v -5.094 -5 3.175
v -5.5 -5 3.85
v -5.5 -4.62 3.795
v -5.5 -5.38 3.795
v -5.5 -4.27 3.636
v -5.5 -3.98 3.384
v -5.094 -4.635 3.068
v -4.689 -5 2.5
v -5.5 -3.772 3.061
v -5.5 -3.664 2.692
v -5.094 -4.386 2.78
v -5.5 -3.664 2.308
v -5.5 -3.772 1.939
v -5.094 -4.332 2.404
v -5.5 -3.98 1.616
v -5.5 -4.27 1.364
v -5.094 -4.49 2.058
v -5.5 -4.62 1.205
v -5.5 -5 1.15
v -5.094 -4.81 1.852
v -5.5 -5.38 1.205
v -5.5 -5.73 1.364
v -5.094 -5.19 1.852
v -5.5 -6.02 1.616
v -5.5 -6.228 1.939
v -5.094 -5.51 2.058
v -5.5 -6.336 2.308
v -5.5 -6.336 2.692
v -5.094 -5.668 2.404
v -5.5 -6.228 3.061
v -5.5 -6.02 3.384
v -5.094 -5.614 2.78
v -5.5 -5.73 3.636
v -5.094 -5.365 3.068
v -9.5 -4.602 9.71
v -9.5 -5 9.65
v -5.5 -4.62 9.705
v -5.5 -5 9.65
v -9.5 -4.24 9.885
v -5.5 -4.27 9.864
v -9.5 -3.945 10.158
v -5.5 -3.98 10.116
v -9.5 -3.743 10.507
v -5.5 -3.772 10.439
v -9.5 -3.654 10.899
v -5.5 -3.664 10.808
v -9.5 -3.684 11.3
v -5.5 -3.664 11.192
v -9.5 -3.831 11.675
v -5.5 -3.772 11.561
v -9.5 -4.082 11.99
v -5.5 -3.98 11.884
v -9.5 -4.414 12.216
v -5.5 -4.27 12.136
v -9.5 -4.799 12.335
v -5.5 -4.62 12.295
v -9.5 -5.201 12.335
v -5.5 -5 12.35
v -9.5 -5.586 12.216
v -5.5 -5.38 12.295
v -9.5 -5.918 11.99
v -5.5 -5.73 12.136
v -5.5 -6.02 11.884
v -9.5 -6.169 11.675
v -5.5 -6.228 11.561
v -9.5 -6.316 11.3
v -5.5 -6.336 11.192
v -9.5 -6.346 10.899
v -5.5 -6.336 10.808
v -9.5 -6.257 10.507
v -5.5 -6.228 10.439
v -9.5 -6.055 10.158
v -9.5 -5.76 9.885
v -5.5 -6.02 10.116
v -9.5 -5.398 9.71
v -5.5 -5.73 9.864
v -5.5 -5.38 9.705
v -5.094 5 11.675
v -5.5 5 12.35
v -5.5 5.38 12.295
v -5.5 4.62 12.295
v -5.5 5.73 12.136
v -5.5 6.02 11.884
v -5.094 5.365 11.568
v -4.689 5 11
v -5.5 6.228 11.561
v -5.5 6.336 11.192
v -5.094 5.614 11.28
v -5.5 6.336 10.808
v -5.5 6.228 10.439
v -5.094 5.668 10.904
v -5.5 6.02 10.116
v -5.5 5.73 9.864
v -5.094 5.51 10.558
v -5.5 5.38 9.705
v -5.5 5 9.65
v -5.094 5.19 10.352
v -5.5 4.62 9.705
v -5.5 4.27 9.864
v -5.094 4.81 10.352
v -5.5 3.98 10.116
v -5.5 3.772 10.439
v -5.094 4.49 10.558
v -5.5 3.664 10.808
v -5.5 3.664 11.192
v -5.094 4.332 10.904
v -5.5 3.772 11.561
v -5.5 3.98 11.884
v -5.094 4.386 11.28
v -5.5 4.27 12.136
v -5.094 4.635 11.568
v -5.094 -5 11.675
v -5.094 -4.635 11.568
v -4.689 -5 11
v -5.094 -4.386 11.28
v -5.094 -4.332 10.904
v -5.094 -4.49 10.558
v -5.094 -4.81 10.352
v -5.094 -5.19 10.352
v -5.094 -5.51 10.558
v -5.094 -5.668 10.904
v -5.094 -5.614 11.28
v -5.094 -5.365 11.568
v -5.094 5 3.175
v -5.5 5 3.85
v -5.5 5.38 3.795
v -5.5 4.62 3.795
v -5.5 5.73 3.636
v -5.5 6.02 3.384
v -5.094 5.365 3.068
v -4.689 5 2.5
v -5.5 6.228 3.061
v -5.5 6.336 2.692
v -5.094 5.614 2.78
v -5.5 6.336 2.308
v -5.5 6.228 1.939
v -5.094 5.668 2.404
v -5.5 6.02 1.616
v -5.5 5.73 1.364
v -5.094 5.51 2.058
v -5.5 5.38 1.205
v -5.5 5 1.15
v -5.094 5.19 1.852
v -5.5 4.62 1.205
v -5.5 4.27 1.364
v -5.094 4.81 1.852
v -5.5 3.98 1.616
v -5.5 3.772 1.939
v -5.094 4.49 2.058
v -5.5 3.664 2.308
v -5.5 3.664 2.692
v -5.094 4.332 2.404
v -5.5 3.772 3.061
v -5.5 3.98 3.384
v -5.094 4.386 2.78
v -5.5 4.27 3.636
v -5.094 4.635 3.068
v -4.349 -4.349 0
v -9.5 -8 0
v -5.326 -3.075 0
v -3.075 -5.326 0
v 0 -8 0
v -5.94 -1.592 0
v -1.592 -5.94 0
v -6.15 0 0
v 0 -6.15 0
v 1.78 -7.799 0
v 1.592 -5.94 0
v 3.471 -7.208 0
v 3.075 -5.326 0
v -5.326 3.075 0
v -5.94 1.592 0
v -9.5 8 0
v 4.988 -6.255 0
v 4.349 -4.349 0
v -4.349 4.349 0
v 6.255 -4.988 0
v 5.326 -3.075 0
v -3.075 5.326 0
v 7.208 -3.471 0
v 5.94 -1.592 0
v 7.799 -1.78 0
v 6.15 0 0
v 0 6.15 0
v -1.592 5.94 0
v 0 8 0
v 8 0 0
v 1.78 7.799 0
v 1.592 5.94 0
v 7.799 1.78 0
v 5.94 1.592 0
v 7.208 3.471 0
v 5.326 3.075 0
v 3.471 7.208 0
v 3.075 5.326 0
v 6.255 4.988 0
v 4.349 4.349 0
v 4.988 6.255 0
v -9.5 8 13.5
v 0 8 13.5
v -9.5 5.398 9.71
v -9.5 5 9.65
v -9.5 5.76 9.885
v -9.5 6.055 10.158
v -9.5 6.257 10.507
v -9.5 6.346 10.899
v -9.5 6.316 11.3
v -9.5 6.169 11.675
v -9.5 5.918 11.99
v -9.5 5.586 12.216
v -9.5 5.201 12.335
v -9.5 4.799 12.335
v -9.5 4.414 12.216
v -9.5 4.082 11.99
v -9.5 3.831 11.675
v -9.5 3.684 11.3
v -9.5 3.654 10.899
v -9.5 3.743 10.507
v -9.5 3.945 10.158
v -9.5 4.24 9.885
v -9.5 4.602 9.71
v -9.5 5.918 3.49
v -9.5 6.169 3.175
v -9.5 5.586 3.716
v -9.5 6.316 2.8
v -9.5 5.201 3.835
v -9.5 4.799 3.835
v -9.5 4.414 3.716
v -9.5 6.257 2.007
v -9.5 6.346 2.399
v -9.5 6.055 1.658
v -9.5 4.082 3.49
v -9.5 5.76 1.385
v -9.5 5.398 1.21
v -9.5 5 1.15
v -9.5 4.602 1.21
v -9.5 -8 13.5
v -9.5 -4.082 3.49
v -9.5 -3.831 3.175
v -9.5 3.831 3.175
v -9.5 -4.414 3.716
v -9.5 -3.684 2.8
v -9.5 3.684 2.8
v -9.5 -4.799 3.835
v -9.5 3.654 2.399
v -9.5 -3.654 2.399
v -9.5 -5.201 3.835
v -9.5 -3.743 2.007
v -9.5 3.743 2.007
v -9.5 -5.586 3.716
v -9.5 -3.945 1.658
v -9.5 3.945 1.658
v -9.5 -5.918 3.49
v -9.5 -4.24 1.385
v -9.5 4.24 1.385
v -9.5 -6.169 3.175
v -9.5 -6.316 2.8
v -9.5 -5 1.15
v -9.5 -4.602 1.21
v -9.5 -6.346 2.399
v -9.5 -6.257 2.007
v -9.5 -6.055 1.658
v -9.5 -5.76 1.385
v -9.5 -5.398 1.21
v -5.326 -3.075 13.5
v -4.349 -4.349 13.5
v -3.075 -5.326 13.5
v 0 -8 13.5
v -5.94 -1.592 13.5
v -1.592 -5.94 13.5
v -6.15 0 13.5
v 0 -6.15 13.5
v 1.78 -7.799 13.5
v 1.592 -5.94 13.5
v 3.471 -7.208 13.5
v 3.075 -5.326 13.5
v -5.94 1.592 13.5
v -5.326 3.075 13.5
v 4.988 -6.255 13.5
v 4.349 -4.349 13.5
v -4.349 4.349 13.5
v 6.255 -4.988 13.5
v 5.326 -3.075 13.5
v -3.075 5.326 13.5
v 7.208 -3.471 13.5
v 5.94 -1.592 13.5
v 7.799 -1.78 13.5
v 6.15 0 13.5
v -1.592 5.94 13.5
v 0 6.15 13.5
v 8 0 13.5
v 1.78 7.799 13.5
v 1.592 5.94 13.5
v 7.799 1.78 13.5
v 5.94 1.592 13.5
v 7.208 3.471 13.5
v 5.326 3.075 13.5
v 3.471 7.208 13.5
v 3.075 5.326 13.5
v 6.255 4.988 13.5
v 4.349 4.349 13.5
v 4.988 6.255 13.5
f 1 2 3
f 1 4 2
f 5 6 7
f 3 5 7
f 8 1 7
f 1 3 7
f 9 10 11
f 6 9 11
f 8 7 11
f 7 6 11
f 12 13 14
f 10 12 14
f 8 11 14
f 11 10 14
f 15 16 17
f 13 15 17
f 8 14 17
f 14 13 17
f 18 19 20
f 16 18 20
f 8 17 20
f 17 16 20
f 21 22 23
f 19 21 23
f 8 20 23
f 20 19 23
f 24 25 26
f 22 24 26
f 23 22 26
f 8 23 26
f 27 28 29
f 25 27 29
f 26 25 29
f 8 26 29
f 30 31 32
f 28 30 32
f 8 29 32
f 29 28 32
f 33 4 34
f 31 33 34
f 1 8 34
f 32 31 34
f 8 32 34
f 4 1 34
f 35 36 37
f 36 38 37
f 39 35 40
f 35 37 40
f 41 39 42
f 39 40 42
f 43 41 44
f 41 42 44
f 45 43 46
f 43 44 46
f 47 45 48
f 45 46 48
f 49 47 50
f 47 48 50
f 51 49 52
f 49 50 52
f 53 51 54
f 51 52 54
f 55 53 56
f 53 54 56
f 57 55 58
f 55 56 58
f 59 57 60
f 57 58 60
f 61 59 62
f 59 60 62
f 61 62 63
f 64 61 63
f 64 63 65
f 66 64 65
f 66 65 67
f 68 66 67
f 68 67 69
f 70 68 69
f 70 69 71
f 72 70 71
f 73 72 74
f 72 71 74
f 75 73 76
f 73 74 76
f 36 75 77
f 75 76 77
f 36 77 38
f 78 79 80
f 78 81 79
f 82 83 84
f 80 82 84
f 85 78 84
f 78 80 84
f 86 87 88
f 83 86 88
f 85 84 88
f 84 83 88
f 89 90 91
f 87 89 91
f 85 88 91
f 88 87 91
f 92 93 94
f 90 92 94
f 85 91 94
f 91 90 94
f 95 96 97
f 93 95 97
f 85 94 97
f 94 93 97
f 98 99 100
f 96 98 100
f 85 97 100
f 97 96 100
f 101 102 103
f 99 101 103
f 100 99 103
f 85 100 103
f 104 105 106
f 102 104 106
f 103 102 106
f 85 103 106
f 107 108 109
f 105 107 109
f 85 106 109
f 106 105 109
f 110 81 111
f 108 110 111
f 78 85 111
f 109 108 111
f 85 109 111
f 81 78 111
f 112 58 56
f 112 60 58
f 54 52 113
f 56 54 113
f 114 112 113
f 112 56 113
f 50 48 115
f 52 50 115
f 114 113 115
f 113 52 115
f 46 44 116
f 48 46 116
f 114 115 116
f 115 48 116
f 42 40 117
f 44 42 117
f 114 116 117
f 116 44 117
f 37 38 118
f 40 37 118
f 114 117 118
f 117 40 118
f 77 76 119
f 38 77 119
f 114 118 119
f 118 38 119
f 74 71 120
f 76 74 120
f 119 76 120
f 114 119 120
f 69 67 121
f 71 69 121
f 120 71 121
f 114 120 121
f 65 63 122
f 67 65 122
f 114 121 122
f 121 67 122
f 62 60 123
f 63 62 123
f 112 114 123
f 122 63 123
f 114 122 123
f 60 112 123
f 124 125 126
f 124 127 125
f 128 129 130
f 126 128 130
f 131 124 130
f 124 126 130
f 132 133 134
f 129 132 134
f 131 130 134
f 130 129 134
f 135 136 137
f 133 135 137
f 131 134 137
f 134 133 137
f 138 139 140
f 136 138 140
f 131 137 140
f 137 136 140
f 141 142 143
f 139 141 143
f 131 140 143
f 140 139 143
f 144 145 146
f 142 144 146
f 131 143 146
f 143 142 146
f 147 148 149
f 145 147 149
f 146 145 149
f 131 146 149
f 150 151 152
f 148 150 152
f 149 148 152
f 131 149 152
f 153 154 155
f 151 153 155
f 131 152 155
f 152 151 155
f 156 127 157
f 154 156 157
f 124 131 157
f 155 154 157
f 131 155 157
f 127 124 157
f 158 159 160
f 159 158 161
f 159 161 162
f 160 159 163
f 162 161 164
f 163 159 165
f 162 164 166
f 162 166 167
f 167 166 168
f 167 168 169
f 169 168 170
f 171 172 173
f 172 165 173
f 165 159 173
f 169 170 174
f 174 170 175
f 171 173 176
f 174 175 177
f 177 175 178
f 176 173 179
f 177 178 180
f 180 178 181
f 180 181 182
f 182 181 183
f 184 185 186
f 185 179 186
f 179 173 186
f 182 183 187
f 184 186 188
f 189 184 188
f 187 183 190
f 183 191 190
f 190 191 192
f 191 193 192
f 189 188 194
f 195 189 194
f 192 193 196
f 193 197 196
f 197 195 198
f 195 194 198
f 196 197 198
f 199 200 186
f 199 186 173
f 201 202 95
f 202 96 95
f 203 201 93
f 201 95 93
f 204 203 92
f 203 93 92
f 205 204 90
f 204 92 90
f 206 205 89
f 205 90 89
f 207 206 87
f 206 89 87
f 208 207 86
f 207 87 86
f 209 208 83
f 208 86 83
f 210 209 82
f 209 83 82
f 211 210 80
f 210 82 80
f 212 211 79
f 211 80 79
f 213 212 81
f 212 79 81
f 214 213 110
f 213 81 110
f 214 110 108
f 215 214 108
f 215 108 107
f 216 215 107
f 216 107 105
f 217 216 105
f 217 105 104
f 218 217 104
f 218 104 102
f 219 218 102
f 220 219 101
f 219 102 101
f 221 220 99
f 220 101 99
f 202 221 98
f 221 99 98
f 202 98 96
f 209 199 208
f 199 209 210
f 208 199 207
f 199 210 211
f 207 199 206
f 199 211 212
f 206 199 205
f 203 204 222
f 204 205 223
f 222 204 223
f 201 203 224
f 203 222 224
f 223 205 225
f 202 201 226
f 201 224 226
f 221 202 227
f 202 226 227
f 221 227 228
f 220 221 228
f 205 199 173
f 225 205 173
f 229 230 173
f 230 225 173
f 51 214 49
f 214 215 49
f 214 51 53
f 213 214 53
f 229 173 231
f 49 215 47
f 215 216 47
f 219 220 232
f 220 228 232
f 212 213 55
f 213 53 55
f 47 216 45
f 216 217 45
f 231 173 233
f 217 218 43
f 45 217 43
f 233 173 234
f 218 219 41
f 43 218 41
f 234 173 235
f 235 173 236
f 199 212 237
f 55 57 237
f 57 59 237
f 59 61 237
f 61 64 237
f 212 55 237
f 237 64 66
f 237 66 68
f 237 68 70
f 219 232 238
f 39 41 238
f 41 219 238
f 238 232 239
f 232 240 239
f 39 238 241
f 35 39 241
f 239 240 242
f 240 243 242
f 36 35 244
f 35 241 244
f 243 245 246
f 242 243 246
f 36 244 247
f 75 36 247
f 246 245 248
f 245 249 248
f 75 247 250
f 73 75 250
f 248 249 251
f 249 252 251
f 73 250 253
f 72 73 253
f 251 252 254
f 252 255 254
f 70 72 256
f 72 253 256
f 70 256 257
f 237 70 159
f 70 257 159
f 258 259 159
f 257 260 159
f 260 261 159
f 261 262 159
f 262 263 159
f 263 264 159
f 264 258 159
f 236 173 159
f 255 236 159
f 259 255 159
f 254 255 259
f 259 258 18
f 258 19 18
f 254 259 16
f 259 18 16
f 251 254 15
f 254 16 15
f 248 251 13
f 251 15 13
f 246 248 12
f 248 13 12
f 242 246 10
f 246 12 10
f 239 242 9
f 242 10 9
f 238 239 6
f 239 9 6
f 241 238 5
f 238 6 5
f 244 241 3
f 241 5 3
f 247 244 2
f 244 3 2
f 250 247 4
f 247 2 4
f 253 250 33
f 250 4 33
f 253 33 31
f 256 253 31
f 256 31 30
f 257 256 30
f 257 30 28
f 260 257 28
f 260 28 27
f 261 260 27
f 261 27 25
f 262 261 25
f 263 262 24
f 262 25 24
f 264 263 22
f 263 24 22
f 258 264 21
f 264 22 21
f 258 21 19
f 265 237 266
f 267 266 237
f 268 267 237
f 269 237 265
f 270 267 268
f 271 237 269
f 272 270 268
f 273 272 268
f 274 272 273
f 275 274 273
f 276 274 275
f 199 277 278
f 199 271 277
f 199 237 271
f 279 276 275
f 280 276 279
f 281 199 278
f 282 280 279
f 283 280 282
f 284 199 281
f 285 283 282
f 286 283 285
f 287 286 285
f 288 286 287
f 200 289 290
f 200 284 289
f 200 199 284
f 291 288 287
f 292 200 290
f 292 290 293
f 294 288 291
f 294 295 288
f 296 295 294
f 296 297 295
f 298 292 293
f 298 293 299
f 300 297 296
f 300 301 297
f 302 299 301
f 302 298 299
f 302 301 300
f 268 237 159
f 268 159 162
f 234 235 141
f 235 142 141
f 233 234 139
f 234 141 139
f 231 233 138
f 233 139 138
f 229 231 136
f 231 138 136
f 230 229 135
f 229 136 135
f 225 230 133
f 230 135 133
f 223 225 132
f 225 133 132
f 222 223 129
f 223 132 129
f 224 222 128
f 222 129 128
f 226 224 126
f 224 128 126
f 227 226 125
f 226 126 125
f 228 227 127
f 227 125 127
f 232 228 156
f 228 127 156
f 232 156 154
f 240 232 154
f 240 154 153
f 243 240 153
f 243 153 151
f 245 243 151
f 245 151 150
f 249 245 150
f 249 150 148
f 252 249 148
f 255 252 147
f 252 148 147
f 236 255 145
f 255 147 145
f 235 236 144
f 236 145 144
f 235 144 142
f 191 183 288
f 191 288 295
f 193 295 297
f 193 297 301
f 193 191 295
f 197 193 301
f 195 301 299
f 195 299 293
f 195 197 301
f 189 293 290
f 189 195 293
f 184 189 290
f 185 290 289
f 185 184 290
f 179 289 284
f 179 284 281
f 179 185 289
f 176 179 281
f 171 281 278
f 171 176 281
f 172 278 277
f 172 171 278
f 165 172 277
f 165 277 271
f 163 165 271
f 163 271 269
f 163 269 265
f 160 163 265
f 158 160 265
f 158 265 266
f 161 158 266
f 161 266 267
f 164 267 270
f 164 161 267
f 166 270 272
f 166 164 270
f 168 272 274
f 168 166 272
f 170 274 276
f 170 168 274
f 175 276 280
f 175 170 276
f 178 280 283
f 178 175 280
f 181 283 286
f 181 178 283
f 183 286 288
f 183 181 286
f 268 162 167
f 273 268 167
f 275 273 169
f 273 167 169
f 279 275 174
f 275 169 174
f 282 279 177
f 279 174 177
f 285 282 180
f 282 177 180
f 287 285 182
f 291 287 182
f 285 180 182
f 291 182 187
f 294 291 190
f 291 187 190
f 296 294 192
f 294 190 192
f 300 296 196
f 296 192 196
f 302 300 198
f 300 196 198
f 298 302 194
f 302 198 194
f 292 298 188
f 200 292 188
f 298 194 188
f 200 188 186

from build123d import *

# Parameters (mm, degrees)
SKETCH1_R                      = 6.15
BOSS_EXTRUDE1_DEPTH            = 13.5
F_2_7_2_7_DIAMETER_HOLE1_D     = 2.7
F_2_7_2_7_DIAMETER_HOLE1_DEPTH = 4
F_2_7_2_7_DIAMETER_HOLE1_TIP   = 0.811161836


with BuildPart() as part:
    # Sketch1 → Boss-Extrude1 (new body)
    with BuildSketch(Plane.XY):
        with BuildLine():
            Line((-9.5, 8), (-9.5, -8))
            Line((-9.5, -8), (0, -8))
            ThreePointArc((0, -8), (8, 0), (0, 8))
            Line((0, 8), (-9.5, 8))
        make_face()
        Circle(SKETCH1_R, mode=Mode.SUBTRACT)
    extrude(amount=BOSS_EXTRUDE1_DEPTH)

    # Ø2.7 (2.7) Diameter Hole1
    with Locations(Plane.ZY.offset(9.5)):
        with Locations((2.5, -5), (2.5, 5), (11, 5), (11, -5)):
            Hole(F_2_7_2_7_DIAMETER_HOLE1_D / 2, depth=F_2_7_2_7_DIAMETER_HOLE1_DEPTH)
            with Locations((0, 0, -(F_2_7_2_7_DIAMETER_HOLE1_DEPTH + F_2_7_2_7_DIAMETER_HOLE1_TIP / 2))):  # 118° drill point
                Cone(0, F_2_7_2_7_DIAMETER_HOLE1_D / 2, F_2_7_2_7_DIAMETER_HOLE1_TIP, mode=Mode.SUBTRACT)


solid = part.part
